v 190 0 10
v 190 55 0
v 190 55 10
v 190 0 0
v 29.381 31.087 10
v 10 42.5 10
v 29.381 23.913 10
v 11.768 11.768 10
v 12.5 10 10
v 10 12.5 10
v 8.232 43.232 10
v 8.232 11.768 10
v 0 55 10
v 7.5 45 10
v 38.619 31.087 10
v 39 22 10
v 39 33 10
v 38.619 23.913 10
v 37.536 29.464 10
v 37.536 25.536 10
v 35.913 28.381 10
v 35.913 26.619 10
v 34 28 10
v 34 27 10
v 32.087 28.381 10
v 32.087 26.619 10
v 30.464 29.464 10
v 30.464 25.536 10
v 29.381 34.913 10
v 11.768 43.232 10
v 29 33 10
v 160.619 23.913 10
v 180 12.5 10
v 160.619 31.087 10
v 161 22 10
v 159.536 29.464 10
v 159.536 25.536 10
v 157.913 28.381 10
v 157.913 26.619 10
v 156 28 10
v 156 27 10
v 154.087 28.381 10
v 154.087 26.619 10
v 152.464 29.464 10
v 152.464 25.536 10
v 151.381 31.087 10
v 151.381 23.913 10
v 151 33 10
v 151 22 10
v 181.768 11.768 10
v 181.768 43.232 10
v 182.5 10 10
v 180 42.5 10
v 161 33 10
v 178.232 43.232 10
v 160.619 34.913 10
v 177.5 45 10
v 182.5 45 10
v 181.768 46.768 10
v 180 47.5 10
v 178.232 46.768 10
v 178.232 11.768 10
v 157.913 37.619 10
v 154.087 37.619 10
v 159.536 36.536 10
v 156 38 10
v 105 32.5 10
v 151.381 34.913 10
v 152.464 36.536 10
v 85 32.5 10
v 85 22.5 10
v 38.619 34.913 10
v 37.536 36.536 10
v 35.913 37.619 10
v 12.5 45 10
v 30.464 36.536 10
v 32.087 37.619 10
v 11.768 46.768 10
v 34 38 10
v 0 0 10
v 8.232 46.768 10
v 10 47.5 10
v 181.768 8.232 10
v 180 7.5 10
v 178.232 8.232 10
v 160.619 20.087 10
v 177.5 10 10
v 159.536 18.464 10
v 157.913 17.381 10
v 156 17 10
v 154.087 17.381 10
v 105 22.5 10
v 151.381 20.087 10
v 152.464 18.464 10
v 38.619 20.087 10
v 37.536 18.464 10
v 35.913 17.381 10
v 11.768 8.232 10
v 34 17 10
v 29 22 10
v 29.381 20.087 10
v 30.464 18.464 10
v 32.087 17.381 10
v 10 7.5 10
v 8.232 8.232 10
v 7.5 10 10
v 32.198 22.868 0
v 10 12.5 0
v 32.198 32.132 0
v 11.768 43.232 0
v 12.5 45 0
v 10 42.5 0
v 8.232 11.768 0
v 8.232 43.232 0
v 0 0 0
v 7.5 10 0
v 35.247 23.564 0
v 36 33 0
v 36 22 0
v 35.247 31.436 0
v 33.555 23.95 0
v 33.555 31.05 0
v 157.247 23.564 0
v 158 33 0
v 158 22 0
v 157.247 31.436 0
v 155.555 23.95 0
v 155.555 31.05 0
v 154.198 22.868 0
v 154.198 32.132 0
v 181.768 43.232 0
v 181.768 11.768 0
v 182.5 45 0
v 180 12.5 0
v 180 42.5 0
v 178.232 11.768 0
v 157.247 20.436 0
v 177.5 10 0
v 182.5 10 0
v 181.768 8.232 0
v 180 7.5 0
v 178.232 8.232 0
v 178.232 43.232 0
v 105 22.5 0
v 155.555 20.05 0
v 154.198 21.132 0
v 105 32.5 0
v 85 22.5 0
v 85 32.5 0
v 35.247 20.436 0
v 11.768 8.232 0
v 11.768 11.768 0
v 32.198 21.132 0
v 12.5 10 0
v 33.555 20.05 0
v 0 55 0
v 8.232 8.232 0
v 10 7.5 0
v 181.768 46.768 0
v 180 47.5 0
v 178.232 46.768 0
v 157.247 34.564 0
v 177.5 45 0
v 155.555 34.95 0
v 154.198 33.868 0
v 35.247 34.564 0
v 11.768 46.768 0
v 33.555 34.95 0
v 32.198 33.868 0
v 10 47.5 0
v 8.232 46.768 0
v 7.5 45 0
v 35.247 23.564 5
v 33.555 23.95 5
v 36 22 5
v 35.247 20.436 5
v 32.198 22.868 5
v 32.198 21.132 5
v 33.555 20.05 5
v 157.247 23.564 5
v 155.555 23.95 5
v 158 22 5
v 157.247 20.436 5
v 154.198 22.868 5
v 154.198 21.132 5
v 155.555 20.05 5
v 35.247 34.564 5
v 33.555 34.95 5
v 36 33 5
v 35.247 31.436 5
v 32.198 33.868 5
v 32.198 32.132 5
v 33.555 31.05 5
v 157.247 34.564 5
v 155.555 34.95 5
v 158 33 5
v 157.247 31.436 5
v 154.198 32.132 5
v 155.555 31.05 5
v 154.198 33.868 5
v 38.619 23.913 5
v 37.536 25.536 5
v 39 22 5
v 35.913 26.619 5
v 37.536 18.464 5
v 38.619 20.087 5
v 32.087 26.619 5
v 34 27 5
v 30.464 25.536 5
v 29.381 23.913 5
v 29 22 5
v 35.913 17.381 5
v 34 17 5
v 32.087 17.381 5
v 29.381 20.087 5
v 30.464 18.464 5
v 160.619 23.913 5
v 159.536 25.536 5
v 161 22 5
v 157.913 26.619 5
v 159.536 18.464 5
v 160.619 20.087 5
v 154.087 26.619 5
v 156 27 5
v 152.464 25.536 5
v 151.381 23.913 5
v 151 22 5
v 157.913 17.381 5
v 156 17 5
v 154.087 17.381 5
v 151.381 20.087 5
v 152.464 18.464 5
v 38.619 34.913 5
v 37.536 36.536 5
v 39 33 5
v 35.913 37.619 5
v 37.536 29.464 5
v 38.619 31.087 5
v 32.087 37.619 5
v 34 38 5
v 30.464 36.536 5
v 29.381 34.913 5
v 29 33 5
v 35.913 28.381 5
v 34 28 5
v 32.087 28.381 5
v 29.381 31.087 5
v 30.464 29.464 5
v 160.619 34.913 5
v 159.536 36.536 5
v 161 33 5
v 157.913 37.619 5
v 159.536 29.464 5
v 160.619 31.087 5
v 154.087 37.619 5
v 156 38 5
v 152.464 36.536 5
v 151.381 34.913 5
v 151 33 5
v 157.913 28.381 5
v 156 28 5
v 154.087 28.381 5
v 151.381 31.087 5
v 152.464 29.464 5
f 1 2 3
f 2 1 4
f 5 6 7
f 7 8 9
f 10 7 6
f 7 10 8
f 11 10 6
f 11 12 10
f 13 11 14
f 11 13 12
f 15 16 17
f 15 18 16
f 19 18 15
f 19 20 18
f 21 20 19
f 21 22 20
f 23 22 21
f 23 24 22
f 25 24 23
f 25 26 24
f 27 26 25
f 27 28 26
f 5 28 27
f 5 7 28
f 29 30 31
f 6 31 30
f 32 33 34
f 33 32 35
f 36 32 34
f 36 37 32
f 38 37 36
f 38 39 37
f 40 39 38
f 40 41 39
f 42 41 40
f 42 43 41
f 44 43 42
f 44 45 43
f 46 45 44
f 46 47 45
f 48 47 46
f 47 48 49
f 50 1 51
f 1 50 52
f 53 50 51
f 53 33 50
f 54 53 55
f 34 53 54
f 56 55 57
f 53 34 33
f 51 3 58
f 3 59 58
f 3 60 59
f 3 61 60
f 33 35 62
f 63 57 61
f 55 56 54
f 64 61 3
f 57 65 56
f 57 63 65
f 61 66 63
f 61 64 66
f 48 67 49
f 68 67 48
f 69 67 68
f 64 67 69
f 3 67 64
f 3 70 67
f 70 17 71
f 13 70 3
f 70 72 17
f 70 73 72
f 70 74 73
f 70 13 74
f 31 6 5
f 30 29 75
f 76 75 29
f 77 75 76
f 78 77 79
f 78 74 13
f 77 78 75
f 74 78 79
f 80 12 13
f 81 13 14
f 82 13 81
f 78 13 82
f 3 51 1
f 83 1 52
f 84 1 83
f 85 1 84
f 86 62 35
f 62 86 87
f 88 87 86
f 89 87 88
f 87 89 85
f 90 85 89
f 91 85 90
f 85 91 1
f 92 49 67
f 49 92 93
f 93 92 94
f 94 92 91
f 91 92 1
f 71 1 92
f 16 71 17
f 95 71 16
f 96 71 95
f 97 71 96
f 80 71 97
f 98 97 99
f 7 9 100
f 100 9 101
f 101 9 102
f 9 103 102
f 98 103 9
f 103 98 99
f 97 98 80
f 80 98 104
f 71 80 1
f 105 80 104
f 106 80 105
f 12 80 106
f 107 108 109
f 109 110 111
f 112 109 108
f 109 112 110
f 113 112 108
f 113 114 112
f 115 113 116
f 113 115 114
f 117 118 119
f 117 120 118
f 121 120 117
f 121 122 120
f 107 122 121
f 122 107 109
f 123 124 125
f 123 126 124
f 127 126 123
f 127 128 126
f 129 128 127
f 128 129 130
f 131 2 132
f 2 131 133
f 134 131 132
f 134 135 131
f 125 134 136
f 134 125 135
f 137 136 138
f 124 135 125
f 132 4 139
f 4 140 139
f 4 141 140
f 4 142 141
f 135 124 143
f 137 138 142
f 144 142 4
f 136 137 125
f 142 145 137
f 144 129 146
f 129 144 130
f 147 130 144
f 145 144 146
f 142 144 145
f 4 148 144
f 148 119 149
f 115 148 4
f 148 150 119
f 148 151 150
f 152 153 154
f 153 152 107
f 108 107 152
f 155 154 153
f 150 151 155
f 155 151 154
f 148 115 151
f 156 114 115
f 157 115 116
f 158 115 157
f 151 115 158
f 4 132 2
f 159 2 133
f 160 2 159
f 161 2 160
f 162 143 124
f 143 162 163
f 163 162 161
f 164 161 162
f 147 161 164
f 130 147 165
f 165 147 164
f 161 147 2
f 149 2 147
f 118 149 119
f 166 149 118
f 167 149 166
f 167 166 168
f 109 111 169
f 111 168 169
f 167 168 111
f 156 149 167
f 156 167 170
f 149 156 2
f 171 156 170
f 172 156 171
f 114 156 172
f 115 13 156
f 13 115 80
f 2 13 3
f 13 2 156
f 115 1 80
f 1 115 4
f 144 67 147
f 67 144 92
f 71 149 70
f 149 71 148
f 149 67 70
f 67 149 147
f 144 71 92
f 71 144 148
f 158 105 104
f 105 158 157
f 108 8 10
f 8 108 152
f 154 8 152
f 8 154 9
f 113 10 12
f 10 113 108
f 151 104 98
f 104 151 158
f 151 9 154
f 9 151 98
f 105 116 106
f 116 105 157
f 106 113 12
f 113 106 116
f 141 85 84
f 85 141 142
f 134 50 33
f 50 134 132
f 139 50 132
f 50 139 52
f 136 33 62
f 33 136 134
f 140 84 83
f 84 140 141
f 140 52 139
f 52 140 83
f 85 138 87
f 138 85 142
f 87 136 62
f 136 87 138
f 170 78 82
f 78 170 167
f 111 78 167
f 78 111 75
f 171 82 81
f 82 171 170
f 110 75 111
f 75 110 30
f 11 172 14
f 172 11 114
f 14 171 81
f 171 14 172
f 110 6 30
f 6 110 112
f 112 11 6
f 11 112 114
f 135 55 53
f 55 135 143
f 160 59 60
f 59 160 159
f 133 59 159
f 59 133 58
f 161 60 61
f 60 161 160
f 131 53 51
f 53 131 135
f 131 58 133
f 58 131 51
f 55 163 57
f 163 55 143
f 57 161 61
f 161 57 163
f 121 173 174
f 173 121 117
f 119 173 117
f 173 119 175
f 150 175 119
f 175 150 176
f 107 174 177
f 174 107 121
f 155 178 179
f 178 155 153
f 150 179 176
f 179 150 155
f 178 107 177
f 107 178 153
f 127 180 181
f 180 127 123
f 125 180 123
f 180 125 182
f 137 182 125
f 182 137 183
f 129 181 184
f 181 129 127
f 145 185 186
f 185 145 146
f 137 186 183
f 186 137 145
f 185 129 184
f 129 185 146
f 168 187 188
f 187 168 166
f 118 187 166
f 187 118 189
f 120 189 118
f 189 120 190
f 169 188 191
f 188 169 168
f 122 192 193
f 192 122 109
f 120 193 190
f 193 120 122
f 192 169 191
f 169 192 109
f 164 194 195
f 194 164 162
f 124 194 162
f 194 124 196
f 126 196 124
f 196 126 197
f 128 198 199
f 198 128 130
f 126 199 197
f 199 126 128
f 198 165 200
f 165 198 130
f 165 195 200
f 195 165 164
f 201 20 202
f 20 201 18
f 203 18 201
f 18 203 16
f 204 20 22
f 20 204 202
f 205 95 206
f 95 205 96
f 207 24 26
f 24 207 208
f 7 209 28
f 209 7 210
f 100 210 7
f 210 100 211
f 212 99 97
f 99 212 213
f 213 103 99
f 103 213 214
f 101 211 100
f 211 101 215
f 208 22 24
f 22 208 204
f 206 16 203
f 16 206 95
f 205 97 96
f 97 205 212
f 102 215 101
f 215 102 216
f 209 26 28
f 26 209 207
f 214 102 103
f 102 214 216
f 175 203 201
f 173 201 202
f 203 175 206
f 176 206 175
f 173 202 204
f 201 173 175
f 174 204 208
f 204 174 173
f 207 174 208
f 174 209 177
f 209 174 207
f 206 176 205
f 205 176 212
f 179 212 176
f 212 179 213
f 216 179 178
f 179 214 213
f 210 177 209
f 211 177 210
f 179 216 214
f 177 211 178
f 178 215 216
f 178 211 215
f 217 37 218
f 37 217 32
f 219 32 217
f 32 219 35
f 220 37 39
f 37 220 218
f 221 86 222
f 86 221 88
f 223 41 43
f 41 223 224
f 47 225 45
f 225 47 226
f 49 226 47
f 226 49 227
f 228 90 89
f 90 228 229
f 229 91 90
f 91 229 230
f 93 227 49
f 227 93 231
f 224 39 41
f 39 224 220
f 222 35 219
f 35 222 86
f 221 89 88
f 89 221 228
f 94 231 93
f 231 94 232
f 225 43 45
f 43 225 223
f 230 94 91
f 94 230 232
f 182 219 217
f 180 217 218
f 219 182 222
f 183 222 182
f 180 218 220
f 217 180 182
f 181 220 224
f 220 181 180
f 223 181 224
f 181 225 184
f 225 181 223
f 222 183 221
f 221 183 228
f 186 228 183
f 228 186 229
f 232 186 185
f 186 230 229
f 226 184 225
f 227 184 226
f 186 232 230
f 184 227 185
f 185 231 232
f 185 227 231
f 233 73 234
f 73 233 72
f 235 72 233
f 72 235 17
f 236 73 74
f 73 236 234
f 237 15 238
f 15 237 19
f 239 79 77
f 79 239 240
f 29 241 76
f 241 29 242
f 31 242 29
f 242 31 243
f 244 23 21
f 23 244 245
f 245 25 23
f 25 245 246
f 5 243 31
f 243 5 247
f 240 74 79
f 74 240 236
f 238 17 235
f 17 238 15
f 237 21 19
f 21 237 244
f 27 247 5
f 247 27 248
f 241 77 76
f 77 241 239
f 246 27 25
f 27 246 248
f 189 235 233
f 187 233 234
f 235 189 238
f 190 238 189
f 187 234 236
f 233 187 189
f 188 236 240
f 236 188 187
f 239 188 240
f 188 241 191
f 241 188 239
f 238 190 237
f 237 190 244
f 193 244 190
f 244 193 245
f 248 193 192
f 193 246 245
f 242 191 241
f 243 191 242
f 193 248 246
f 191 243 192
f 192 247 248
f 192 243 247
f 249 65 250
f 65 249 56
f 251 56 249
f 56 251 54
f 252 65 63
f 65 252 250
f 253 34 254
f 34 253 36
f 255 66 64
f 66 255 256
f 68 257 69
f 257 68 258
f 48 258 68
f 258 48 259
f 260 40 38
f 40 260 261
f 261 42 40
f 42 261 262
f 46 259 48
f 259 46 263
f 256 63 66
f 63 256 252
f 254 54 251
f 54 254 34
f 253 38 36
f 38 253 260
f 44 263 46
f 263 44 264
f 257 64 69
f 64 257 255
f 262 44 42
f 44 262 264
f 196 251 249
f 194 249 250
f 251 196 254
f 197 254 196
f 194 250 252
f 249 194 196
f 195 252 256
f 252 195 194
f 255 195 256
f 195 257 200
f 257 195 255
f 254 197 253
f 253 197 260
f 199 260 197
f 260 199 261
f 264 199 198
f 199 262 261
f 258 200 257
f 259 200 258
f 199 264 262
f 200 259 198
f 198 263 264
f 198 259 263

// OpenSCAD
BoxW=190;
BoxD=55;
BoxH=10;
FromEdge=10;
MountHole=5;
displayHole=4;
ScrewHead=10;
xdist=122;
ydist=11;
xDFE=(BoxW-xdist)/2;
yDFE=(BoxD-ydist)/2;
DrillLen=BoxH*2;

difference()
{
  cube([BoxW,BoxD,BoxH]);
  translate([BoxW/2-10,BoxD/2-5,-2]) cube([20,10,15]);
  translate([FromEdge,FromEdge,-5]) cylinder(h=DrillLen,d=MountHole);
  translate([BoxW-FromEdge,FromEdge,-5]) cylinder(h=DrillLen,d=MountHole);   
  translate([FromEdge,BoxD-FromEdge,-5]) cylinder(h=DrillLen,d=MountHole);
  translate([BoxW-FromEdge,BoxD-FromEdge,-5]) cylinder(h=DrillLen,d=MountHole);   

  translate([xDFE,yDFE,-5]) cylinder(h=DrillLen,d=displayHole);
  translate([xDFE+xdist,yDFE,-5]) cylinder(h=DrillLen,d=displayHole);   
  translate([xDFE,yDFE+ydist,-5]) cylinder(h=DrillLen,d=displayHole);
  translate([xDFE+xdist,yDFE+ydist,-5]) cylinder(h=DrillLen,d=displayHole);
  
  translate([xDFE,yDFE,5]) cylinder(h=DrillLen,d=ScrewHead);
  translate([xDFE+xdist,yDFE,5]) cylinder(h=DrillLen,d=ScrewHead);   
  translate([xDFE,yDFE+ydist,5]) cylinder(h=DrillLen,d=ScrewHead);
  translate([xDFE+xdist,yDFE+ydist,5]) cylinder(h=DrillLen,d=ScrewHead);   

}
